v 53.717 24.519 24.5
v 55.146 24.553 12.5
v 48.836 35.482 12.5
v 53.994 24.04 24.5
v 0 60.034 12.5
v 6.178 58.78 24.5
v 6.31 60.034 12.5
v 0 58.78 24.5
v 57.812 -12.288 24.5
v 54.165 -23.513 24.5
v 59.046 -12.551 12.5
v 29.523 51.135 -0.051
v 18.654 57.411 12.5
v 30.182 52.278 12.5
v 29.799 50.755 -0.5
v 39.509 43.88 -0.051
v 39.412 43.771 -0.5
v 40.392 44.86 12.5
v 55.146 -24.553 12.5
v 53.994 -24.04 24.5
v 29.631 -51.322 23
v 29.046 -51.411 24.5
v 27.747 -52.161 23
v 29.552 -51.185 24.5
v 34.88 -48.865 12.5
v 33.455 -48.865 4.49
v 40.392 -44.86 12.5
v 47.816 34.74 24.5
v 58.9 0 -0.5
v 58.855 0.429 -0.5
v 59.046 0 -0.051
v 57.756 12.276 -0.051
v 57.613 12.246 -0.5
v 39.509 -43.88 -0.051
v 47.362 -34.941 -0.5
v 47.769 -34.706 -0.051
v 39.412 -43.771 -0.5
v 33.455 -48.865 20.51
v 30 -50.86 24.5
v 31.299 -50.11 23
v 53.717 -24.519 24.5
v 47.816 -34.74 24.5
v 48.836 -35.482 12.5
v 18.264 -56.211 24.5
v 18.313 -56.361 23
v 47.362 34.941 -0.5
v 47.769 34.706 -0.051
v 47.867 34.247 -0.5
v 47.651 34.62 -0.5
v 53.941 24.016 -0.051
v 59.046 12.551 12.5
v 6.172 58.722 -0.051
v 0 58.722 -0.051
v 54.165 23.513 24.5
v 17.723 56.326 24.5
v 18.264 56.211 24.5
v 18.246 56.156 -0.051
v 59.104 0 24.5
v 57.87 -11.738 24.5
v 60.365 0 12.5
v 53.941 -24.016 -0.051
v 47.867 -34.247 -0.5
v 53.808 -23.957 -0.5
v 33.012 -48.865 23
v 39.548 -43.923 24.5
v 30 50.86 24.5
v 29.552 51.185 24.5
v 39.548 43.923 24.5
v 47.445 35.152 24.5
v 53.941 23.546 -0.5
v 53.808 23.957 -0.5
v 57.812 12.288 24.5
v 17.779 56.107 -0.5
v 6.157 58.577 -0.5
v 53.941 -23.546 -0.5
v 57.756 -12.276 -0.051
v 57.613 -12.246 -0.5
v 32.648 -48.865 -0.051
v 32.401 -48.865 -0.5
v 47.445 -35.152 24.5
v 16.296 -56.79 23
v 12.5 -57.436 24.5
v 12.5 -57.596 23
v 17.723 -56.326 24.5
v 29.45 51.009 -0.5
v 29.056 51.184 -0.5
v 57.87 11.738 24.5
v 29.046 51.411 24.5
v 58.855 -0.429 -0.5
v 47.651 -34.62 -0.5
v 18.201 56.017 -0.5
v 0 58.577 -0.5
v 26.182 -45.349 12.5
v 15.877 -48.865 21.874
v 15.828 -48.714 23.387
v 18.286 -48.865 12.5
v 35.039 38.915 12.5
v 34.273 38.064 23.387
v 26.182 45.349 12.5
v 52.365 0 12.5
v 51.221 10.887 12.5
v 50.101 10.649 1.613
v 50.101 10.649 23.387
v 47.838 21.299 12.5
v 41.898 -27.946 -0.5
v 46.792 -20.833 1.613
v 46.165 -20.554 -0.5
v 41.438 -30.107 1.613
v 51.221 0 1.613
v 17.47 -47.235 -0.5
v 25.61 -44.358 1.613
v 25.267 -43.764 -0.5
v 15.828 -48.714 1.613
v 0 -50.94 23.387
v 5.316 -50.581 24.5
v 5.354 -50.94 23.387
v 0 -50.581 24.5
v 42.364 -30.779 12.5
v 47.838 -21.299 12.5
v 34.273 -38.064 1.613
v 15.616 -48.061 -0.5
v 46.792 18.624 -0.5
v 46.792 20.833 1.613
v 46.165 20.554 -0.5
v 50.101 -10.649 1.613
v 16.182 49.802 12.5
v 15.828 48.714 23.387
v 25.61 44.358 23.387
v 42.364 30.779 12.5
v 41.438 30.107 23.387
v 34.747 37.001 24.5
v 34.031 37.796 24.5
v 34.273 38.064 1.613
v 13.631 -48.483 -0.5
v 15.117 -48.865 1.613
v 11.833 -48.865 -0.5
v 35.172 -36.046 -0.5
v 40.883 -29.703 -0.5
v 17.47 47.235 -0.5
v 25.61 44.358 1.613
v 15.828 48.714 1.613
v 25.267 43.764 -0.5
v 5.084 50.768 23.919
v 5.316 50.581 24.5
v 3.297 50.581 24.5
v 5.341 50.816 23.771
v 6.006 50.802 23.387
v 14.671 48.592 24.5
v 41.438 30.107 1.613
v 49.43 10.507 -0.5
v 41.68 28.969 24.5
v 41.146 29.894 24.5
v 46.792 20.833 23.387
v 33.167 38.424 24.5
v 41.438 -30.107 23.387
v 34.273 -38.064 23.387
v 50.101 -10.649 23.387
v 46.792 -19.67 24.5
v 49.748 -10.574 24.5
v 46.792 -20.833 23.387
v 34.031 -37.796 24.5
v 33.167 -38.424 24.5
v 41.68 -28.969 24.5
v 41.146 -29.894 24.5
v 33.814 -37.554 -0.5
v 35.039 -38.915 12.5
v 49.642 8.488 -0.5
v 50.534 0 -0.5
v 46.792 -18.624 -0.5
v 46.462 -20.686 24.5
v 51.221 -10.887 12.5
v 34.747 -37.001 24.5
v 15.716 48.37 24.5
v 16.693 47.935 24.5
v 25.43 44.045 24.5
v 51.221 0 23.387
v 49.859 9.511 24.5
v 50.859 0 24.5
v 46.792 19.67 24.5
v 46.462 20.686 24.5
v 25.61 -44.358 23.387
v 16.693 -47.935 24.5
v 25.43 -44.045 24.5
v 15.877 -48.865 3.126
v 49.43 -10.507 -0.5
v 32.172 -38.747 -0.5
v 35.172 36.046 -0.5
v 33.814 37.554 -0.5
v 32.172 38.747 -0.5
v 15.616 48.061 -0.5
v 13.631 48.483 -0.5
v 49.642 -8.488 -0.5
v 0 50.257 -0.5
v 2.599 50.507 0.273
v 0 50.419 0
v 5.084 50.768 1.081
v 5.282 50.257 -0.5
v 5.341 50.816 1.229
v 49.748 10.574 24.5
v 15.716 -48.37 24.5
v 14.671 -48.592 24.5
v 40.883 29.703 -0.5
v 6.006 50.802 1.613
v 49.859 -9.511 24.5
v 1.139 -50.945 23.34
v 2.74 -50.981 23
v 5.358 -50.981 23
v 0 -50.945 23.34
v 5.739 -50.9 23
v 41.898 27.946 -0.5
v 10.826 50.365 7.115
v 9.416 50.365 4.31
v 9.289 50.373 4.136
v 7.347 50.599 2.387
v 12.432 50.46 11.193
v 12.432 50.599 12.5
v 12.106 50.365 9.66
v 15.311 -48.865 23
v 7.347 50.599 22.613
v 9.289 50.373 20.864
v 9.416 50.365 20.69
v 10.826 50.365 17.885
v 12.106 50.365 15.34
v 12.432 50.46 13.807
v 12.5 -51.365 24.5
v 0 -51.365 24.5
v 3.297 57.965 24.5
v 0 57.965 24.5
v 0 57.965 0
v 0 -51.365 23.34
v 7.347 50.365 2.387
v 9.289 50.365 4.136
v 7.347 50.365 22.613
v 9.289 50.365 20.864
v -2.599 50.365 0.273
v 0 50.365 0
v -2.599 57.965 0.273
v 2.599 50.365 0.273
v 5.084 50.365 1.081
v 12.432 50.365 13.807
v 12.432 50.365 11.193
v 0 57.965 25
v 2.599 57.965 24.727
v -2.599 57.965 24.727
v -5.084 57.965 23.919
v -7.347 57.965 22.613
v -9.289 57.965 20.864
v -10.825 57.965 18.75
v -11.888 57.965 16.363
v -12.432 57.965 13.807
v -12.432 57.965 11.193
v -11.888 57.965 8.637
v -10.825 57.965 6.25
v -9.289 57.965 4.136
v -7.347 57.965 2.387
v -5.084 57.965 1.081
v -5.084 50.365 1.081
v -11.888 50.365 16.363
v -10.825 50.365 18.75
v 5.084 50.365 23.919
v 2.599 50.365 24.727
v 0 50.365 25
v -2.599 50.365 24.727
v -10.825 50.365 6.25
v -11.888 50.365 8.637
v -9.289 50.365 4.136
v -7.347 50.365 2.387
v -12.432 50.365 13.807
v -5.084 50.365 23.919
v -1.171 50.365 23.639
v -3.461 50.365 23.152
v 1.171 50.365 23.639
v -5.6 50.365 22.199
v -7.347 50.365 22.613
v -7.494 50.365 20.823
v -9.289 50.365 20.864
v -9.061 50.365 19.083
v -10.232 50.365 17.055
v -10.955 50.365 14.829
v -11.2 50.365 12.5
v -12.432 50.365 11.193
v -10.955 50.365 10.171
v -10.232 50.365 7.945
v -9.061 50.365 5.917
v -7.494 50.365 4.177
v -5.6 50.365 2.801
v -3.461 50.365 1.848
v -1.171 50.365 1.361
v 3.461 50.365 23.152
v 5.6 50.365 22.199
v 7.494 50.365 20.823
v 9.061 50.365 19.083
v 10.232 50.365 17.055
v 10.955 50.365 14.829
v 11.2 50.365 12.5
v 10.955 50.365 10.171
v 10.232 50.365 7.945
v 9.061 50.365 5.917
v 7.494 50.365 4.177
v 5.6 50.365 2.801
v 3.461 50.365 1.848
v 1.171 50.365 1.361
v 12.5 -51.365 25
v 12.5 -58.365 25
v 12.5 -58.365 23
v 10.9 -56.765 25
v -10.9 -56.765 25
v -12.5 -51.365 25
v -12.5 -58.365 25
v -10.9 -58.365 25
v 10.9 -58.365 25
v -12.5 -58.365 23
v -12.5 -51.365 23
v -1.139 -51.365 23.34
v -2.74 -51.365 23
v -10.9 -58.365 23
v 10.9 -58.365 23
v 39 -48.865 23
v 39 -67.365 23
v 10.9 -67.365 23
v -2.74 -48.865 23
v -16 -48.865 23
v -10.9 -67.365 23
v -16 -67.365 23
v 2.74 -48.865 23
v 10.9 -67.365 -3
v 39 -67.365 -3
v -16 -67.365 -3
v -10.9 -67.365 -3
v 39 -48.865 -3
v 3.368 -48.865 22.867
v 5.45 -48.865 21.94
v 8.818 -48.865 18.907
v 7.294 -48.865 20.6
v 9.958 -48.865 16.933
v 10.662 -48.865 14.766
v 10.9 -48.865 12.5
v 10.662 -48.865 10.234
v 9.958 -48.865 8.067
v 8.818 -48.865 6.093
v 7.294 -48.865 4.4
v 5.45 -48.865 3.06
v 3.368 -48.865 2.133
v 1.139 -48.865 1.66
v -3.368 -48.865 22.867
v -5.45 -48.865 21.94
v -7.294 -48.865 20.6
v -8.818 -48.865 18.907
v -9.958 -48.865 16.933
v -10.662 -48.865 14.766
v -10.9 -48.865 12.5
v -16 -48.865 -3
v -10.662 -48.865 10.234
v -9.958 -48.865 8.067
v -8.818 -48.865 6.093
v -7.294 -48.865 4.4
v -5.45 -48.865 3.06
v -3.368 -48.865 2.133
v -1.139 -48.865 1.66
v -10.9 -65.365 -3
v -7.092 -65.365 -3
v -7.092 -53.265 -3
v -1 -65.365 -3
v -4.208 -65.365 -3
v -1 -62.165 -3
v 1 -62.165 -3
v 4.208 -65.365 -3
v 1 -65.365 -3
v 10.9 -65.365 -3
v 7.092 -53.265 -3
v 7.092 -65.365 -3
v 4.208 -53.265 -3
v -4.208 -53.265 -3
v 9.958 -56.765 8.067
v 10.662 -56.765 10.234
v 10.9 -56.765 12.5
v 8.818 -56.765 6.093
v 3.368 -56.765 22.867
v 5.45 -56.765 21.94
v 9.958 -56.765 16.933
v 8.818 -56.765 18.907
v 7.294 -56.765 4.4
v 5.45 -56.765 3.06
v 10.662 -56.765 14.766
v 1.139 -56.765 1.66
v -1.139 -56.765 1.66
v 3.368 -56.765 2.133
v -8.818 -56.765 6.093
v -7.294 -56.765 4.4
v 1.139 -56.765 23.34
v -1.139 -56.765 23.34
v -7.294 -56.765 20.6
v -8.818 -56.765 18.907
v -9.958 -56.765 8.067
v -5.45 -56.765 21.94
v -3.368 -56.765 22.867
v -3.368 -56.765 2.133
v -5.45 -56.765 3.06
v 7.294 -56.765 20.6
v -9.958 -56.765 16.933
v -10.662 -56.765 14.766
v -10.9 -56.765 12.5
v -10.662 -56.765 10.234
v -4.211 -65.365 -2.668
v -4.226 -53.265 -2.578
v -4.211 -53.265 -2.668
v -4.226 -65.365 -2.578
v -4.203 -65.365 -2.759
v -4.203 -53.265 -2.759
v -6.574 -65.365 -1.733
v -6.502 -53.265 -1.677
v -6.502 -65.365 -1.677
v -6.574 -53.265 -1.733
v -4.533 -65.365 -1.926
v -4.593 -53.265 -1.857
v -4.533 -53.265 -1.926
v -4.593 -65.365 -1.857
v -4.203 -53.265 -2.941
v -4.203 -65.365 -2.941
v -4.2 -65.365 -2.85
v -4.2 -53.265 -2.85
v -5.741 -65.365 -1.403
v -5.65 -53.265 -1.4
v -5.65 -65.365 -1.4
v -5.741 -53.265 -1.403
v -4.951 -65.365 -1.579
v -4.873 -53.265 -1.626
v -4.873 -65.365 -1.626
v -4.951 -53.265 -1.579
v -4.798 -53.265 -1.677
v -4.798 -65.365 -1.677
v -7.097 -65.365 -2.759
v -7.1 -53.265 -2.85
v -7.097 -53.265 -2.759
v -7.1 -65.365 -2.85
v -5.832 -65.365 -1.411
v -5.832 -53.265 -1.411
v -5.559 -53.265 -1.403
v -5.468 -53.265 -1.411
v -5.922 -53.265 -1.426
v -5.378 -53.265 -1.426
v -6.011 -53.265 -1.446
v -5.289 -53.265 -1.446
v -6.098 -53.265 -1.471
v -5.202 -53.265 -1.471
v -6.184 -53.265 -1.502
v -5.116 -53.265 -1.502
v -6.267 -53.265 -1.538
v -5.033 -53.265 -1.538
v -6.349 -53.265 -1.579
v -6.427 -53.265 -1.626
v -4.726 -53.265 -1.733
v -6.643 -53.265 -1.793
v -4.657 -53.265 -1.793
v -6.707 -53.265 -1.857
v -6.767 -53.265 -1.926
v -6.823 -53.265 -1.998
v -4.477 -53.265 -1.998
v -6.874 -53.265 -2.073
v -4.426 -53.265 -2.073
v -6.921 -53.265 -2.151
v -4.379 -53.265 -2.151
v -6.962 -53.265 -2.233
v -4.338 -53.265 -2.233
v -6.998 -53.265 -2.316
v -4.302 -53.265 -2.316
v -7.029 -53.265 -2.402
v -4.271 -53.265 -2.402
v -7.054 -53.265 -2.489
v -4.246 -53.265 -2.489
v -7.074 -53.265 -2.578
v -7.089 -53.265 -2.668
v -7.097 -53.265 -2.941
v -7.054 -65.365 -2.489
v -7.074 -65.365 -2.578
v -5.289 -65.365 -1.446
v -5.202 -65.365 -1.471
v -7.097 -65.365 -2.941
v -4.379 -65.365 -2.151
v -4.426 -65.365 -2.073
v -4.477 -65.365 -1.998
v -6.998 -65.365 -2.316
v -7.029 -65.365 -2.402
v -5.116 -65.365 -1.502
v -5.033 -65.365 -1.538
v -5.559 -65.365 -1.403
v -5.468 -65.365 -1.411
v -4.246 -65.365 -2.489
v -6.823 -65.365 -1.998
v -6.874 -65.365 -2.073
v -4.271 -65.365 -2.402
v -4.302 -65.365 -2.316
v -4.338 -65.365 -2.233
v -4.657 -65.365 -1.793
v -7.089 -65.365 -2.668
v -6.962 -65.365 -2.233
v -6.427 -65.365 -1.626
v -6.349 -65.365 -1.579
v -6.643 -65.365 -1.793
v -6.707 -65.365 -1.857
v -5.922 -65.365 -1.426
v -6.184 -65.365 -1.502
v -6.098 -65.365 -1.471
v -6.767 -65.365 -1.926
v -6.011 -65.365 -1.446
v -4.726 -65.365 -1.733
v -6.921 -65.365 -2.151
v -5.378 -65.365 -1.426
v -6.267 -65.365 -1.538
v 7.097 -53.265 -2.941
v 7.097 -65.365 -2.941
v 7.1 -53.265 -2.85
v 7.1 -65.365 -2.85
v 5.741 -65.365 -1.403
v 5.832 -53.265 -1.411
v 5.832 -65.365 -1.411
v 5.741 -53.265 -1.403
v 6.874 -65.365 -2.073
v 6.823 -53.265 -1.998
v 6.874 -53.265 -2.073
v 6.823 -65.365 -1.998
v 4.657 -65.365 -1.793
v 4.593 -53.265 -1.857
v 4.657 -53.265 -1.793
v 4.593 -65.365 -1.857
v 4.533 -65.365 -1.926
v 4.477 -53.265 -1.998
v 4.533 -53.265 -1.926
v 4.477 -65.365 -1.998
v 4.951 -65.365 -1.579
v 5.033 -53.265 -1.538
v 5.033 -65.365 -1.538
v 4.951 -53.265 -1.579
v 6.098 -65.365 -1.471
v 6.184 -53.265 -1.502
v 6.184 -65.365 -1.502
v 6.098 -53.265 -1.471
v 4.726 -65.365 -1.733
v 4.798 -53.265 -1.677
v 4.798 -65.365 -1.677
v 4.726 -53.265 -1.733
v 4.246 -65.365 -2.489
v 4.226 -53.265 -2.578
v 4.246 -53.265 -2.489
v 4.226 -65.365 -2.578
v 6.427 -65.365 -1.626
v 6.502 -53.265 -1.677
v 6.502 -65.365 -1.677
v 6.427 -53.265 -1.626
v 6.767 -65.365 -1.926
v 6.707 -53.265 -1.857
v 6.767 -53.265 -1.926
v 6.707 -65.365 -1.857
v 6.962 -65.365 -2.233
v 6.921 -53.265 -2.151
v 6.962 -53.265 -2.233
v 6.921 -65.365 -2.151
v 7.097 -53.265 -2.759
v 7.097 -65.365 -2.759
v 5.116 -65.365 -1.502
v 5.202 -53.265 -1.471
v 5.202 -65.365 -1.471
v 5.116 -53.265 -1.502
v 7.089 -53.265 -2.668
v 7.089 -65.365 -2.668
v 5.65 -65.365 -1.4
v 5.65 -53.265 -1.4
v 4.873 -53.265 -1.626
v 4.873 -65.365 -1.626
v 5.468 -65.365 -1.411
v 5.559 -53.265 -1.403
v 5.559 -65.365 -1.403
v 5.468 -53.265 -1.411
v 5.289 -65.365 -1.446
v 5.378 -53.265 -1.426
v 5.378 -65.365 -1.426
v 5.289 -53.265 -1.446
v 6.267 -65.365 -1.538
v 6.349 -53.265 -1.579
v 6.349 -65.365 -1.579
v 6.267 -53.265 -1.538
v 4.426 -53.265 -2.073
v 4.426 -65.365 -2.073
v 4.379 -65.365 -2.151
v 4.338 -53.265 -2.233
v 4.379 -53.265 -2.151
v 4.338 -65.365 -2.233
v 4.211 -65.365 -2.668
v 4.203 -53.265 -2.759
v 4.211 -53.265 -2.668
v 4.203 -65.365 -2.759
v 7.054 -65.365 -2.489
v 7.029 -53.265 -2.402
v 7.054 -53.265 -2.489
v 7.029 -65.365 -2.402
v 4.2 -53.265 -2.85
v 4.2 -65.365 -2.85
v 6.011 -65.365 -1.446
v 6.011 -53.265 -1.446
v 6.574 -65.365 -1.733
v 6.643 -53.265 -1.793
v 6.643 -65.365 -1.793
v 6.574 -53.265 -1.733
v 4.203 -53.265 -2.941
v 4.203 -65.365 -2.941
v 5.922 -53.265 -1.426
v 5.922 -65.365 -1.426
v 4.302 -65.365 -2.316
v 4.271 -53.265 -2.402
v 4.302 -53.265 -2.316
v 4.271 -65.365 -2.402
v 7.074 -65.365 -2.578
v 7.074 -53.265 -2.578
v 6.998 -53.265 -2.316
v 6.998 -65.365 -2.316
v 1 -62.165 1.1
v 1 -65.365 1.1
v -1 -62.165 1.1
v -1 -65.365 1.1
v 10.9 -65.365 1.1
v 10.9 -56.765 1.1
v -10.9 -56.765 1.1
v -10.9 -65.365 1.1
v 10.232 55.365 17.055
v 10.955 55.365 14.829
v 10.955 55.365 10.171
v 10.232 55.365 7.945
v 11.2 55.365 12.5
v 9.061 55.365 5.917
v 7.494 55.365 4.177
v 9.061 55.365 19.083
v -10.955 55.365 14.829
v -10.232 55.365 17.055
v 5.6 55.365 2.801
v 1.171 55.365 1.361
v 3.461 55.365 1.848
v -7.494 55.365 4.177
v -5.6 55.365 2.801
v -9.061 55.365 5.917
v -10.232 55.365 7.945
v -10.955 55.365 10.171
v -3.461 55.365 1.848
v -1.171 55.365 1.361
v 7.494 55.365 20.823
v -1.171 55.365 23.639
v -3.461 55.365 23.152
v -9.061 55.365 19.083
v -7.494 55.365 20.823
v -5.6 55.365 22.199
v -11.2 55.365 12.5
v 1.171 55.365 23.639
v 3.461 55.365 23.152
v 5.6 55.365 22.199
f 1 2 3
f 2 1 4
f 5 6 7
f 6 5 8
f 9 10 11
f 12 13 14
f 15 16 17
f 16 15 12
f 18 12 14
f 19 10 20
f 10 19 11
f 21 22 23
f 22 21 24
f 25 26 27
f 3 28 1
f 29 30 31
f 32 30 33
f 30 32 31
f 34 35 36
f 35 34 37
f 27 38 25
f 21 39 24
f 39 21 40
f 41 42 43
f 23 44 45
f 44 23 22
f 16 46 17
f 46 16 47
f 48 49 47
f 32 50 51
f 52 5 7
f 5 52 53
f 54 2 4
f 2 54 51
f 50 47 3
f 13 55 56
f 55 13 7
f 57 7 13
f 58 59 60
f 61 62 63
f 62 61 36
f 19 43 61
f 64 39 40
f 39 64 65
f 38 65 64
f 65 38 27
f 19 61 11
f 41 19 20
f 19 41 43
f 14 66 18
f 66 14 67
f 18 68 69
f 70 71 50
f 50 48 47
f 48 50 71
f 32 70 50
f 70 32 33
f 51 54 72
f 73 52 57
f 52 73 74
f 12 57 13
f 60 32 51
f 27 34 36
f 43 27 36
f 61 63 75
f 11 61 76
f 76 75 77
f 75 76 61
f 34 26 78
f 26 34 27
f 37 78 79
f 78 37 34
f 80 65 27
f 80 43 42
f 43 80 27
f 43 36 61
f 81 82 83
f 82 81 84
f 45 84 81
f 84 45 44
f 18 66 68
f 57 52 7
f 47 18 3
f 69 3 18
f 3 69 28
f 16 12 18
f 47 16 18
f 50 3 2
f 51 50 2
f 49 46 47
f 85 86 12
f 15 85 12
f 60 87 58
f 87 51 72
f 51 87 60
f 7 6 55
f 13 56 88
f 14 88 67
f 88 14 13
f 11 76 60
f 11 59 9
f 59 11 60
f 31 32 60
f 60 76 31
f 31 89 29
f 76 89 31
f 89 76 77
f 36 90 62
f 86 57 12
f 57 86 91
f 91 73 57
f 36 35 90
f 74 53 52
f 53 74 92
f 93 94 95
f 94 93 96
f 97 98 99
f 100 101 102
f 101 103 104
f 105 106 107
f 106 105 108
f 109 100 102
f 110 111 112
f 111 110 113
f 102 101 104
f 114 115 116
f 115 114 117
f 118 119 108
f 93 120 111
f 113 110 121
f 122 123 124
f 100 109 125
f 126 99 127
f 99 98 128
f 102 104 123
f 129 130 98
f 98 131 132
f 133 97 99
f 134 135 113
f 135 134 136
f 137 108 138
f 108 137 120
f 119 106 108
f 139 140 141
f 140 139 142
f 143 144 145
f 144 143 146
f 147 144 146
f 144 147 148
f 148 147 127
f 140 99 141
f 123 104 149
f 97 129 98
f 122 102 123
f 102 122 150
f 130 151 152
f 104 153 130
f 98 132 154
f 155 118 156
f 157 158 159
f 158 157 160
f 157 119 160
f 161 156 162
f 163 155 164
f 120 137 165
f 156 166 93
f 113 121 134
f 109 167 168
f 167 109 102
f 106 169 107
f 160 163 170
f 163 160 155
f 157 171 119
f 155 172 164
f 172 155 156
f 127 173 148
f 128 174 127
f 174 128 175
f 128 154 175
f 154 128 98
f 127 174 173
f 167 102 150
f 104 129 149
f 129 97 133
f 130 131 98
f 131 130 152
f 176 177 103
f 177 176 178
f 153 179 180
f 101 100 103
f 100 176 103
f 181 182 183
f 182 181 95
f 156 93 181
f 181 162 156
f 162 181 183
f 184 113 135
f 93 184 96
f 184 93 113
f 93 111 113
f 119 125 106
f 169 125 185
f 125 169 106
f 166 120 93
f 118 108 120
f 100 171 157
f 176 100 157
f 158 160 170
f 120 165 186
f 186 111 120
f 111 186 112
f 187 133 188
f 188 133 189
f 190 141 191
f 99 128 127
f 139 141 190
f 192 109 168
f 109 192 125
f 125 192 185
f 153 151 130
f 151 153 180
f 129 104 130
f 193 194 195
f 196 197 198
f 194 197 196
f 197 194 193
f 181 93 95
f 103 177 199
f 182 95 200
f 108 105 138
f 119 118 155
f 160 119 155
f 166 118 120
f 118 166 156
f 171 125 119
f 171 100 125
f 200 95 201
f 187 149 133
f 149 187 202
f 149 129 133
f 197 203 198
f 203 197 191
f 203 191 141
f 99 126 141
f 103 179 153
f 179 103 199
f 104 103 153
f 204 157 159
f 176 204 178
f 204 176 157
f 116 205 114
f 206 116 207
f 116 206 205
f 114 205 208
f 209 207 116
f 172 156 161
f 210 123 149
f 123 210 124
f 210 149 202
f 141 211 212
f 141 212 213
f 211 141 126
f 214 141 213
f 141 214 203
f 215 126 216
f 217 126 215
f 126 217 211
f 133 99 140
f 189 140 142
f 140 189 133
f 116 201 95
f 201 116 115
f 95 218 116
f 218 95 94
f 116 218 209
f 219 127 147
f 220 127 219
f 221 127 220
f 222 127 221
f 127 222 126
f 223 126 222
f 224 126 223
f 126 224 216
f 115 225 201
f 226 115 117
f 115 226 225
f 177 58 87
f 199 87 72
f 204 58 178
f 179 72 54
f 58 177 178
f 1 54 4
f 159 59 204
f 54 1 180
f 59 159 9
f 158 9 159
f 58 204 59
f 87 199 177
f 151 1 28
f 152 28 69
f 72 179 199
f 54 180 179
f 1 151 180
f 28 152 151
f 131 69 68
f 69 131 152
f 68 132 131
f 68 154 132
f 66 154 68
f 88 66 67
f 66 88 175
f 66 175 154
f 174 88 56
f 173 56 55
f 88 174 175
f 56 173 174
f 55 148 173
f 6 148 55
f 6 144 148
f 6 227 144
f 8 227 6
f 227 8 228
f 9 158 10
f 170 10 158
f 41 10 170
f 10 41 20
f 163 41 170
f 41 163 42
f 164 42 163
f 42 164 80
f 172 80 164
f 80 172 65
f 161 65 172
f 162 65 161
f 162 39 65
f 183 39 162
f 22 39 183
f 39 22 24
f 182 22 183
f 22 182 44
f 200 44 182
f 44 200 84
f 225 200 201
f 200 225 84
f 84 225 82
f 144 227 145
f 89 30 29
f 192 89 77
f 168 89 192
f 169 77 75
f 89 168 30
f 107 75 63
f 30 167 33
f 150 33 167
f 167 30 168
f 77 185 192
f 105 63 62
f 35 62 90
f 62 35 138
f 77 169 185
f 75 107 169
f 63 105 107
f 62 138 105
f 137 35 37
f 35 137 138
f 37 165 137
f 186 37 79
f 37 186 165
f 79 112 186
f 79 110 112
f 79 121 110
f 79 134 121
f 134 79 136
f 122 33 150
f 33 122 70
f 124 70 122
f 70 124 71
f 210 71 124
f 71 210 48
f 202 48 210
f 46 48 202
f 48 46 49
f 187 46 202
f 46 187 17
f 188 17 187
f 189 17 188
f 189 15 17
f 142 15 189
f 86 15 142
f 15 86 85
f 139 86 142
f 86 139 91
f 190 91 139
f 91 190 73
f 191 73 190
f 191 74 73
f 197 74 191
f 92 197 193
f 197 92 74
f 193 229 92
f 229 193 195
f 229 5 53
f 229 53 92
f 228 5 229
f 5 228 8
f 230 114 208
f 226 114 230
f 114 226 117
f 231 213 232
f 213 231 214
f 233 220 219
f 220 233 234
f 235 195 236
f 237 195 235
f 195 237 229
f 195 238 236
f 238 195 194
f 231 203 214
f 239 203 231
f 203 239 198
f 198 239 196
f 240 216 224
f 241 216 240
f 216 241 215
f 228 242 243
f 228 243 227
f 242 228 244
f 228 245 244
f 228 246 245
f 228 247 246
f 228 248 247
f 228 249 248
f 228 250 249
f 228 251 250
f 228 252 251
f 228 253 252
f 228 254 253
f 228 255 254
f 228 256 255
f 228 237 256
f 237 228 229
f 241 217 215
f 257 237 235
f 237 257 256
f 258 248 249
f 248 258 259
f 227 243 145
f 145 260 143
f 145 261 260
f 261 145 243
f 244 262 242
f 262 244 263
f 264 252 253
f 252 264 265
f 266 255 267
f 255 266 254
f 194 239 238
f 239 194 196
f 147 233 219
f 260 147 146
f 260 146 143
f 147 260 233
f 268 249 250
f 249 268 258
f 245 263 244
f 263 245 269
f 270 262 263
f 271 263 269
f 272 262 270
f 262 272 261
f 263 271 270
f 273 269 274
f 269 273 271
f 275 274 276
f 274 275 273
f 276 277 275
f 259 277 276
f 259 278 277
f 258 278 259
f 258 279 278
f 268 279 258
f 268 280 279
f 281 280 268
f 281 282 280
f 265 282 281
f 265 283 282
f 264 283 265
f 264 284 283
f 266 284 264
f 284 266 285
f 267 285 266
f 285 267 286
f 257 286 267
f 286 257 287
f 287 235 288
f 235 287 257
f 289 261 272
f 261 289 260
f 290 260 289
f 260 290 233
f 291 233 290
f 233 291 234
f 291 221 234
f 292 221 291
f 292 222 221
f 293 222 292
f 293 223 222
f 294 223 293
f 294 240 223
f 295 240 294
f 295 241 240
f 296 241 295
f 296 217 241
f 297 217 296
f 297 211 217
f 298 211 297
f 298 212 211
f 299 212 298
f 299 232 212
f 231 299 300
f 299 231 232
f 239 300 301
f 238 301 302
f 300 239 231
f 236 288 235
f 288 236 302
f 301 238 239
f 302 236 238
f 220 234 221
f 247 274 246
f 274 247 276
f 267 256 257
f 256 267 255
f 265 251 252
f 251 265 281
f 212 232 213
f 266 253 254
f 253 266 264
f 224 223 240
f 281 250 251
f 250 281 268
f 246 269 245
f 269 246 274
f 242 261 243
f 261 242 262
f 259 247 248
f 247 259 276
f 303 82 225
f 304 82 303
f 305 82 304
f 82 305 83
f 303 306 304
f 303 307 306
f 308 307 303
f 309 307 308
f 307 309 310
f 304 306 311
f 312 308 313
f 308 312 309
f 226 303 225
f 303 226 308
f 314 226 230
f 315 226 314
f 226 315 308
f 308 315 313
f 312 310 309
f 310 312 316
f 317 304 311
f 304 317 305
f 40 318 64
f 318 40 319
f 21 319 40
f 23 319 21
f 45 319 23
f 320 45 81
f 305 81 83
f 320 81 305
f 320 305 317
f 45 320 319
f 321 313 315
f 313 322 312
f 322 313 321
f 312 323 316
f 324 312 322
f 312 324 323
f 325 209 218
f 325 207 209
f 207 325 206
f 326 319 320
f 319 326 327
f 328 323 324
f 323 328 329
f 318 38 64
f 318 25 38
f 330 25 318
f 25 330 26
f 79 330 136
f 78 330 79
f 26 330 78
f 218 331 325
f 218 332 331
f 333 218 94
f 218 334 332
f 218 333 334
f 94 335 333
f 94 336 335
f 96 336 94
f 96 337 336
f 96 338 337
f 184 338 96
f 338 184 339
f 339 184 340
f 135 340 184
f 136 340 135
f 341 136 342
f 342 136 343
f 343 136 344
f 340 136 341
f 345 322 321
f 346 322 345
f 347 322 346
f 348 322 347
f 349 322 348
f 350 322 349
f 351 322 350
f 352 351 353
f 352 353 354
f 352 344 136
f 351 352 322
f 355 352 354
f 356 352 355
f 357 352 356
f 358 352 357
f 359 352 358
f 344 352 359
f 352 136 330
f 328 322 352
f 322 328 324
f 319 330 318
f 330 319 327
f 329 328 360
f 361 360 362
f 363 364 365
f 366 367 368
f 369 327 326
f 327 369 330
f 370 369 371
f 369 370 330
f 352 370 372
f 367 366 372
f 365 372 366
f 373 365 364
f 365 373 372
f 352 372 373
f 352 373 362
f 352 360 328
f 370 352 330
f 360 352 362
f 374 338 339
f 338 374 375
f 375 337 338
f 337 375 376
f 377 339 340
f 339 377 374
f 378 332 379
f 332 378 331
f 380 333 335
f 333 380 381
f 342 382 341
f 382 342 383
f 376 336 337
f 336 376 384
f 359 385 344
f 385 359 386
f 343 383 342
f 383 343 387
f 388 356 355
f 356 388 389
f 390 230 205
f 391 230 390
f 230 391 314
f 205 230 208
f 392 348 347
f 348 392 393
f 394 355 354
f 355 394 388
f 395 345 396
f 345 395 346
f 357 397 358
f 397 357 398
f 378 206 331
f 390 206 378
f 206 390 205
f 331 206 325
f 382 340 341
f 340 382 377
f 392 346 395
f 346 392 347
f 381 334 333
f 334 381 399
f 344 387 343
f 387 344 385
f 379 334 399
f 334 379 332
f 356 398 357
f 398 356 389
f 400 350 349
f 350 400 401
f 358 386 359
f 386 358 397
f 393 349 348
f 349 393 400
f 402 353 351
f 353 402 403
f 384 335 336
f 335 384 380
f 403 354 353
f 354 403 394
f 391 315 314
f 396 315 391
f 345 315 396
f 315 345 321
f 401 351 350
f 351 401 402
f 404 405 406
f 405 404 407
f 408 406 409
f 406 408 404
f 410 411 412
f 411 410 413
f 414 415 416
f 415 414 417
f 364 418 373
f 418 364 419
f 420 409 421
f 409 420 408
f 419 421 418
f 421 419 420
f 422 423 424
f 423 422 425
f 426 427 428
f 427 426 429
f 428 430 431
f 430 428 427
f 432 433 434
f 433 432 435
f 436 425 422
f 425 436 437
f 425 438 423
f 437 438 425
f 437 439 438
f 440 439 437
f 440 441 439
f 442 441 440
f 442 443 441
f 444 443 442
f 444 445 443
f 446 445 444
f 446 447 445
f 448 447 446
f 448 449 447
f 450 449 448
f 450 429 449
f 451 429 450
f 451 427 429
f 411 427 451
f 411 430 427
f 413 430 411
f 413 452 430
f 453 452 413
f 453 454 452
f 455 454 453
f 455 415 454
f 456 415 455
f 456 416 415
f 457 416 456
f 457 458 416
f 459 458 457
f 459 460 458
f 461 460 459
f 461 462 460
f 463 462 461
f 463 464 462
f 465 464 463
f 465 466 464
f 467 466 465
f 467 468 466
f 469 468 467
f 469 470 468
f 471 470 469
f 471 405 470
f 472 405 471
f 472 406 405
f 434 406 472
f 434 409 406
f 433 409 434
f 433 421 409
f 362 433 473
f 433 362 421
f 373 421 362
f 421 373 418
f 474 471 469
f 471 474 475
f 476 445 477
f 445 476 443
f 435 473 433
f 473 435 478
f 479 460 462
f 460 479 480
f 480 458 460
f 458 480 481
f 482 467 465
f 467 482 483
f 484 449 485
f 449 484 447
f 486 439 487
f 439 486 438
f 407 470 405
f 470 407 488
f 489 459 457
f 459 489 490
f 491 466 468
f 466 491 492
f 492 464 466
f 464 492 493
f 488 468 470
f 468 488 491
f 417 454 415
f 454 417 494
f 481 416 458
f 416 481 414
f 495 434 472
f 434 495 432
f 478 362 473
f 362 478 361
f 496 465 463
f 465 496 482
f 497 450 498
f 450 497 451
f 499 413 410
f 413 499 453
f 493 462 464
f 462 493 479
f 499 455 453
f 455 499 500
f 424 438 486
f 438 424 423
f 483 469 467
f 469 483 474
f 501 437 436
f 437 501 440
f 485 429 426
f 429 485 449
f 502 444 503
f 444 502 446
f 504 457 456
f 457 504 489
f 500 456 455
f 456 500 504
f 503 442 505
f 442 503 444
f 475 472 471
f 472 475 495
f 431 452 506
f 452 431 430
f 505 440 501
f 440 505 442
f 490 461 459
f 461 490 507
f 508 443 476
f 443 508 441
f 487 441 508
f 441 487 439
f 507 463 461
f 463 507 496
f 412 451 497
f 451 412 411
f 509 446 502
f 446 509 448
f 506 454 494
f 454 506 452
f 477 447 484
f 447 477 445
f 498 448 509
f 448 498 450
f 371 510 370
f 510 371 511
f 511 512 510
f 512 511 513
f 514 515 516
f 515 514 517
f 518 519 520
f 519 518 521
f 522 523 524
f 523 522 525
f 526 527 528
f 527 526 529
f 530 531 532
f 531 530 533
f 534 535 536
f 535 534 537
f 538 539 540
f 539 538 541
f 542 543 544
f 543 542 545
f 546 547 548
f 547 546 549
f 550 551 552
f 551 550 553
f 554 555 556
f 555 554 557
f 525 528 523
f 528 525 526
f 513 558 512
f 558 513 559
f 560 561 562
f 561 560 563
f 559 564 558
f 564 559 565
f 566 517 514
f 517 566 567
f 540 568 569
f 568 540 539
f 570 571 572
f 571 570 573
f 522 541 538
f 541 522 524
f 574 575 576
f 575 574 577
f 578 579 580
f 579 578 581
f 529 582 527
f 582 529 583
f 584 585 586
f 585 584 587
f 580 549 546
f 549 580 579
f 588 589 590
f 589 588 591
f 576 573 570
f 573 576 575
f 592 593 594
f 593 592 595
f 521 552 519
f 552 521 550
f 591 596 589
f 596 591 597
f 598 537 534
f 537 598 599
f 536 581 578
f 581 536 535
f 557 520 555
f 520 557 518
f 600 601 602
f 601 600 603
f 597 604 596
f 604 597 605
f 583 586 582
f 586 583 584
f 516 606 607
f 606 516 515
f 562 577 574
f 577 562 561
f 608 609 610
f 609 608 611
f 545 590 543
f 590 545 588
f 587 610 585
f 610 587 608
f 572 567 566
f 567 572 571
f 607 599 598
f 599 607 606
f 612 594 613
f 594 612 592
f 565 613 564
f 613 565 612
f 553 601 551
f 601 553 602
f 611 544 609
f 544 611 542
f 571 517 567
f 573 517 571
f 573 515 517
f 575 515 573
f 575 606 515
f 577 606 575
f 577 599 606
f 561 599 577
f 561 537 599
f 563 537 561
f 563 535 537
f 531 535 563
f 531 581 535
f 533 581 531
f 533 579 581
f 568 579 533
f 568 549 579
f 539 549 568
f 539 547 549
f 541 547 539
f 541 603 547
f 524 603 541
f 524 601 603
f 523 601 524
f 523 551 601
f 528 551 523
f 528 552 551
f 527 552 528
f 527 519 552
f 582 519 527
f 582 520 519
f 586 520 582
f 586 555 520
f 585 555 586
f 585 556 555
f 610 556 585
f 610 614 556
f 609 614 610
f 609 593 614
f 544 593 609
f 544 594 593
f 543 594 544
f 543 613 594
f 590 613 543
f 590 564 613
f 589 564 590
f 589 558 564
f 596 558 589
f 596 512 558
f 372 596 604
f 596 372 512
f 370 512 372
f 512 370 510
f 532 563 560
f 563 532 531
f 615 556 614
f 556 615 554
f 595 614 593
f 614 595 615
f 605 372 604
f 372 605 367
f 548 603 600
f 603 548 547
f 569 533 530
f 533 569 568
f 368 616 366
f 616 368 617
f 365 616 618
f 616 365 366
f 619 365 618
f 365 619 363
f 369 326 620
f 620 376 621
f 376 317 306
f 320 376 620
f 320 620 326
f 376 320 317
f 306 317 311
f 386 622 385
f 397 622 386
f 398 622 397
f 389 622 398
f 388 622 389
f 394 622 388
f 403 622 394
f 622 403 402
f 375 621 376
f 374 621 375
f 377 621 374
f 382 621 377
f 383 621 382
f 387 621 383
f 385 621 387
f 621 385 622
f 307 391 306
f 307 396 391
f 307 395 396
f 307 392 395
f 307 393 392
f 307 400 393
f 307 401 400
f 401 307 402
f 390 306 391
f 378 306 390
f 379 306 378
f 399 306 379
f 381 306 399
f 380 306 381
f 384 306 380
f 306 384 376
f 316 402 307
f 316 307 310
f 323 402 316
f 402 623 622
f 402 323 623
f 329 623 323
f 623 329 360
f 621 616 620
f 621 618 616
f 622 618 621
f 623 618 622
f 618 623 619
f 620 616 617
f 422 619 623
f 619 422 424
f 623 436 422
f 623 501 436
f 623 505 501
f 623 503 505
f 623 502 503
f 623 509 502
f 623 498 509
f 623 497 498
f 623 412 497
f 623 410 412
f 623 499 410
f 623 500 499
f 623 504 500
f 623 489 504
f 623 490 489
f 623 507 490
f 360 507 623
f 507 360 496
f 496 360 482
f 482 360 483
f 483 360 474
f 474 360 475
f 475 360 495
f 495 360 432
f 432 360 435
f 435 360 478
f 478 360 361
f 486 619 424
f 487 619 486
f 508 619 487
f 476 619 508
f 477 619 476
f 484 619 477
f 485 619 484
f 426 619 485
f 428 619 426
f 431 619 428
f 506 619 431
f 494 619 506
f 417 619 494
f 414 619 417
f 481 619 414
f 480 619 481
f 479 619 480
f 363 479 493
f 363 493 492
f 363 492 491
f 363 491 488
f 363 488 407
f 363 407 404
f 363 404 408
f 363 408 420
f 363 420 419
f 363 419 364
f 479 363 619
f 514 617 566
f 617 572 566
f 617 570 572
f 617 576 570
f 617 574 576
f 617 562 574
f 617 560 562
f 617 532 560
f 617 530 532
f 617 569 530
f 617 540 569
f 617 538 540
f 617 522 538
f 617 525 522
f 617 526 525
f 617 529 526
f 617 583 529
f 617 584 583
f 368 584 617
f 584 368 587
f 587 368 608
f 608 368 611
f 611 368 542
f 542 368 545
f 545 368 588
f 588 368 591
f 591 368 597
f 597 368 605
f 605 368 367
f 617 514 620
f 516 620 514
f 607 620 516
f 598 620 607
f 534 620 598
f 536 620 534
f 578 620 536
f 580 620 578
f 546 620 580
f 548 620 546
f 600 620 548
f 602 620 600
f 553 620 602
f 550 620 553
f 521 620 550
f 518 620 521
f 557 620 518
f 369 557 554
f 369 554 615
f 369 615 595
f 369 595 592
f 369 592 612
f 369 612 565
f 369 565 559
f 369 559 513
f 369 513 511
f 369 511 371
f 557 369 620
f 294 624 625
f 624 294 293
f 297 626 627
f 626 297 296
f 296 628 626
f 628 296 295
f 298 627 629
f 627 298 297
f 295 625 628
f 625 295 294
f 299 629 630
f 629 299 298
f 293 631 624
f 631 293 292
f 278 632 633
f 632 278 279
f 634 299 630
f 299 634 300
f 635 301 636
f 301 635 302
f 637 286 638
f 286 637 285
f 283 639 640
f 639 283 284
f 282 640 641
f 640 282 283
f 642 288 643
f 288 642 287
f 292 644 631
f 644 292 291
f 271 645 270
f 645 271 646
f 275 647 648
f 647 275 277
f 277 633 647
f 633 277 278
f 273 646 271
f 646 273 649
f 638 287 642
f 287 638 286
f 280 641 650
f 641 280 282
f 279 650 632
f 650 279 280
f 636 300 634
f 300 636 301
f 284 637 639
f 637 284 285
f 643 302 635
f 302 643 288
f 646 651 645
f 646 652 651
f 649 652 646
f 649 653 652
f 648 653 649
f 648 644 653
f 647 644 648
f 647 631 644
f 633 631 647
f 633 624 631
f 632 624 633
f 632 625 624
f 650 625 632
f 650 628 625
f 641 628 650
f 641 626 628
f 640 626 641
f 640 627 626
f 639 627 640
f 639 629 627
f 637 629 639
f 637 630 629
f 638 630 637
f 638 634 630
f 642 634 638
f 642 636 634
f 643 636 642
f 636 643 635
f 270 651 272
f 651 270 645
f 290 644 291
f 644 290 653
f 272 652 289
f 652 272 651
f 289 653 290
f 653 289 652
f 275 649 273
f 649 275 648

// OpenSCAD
// file: ../../../hardware/Vitamins/Sensors/Camera/QuickCam_STX.scad
$fn = 60;

function getNubRadius() =1.3;
function getPinHeight() = 10;
function getFlangeWidth(tolerance)= 2.3 + tolerance;
function getFlangeLength(tolerance)= 6.64 + tolerance;
function getQuickCamRadius(tolerance)= 55.93/2 +tolerance;
function getLandingPadThickness() = 5;
function getUsbWidth() = 9.5;
function getUsbHeight()=17.5;

module CameraMount( 3dPrinterTolerance=.4)
{
	union(){
		//central pin	
		cylinder(getPinHeight(),							// length of the pin
				 (4.5-3dPrinterTolerance)/2, 	// radius of the pin
				 (4.5-3dPrinterTolerance)/2, 	// radius of the pin
				 false);						//non centered
		//nubs			 
		translate([0,getNubRadius(),getPinHeight()-getNubRadius()]){
			rotate([0,90,0]){		 
				cylinder(getFlangeWidth(3dPrinterTolerance),	// length of the pin
					 getNubRadius(), 	// radius of the pin
					 getNubRadius(), 	// radius of the pin
					 true);						//non centered
			 }
		}
		//nubs			 
		translate([0,-getNubRadius(),getPinHeight()-getNubRadius()]){
			rotate([0,90,0]){		 
				cylinder(getFlangeWidth(3dPrinterTolerance),	// length of the pin
					 getNubRadius(), 	// radius of the pin
					 getNubRadius(), 	// radius of the pin
					 true);						//non centered
			 }
		}
		//Flange		 
		translate([getFlangeWidth(3dPrinterTolerance)/-2,getFlangeLength(3dPrinterTolerance)/-2,0]){		 
			cube([	getFlangeWidth(3dPrinterTolerance), 
					getFlangeLength(3dPrinterTolerance), 
					getPinHeight()-getFlangeWidth(3dPrinterTolerance)-1
				]);
		}		 
		// Landing pad			 
		translate([0,0,-getLandingPadThickness()]){		 
			cylinder(getLandingPadThickness(),	// length of the landing pad
					 15, 						// radius of the landing pad
					 15, 						// radius of the landing pad
					 false);
		}		 
	}		 
	
}

module cameraViewingCone(){

}

module QuickCam(3dPrinterTolerance=.4){
	union(){
		difference(){
			translate([0,0,getQuickCamRadius(3dPrinterTolerance)]){		 
				sphere(getQuickCamRadius(3dPrinterTolerance));
			}	
			
			CameraMount( 3dPrinterTolerance);
		}
		color("red"){
			translate([0,0,getQuickCamRadius(3dPrinterTolerance)]){	
				rotate([90,0,0]){
					cylinder(	getQuickCamRadius(3dPrinterTolerance)*2,	//
								0, 						// 
						 		50, 						// 
						 		false);
		 		}
			}	
		}
		translate([0,0,getQuickCamRadius(3dPrinterTolerance)]){	
			rotate([-125,0,0]){
				translate([-getUsbHeight()/2,0,0]){	
					cube([	getUsbHeight(),
					 		getUsbWidth(),
					 		getQuickCamRadius(3dPrinterTolerance)*1.5]);
			 	}
	 		}
		}
		
	}
}

module camInterface(){
//translate([0,0,getLandingPadThickness()]){
//	CameraMount();
//}
	difference(){	 
		#cylinder(	getQuickCamRadius(0),	//
					getQuickCamRadius(0), 						// 
			 		getQuickCamRadius(0), 						// 
			 		false);
		translate([0,0,4]){	
			QuickCam();
		}
	}

}
camInterface();
//QuickCam();
// file: ../../../hardware/Vitamins/Structural/SealedBearings/SealedBearing608_Vitamin.scad
function 608BallBearingDiam(3dPrinterTolerance=.4) = 22+3dPrinterTolerance;
function 608BallBearingHeight(3dPrinterTolerance=.4) = 7+3dPrinterTolerance;
function 608BallBearingInnerDiam(3dPrinterTolerance=.4)= 8-3dPrinterTolerance;

function 608BallBearingAvgDiam(3dPrinterTolerance=.4)= (608BallBearingDiam(3dPrinterTolerance)+608BallBearingInnerDiam(3dPrinterTolerance))/2;


module 608BallBearing(3dPrinterTolerance=.4)
{
	union()
	{
		cylinder(608BallBearingHeight(3dPrinterTolerance), 608BallBearingDiam(3dPrinterTolerance)/2, 608BallBearingDiam(3dPrinterTolerance)/2, 0);
		//cylinder(608BallBearingHeight(3dPrinterTolerance), 608BallBearingInnerDiam(3dPrinterTolerance)/2, 608BallBearingInnerDiam(3dPrinterTolerance)/2);
	}
}

608BallBearing();
// file: TiltRingHolder.scad
use <CameraMount.scad>
use <../../../hardware/Vitamins/Actuators/StandardServo/StandardServo_Vitamin.scad>
use <../../../hardware/Vitamins/Structural/SealedBearings/SealedBearing608_Vitamin.scad>
use <../../../hardware/Vitamins/Sensors/Camera/QuickCam_STX.scad>

function getRingRadius(3dPrinterTolerance=.4) = getQuickCamRadius(3dPrinterTolerance)+getCamerabarWidth()*2;


module clearenceParts(3dPrinterTolerance=.4){
	union(){
		cameraTiltBar();
		cameraTiltServo();
		placeBearingPart(3dPrinterTolerance){
			608BallBearing(3dPrinterTolerance);		
		}
	}
}

module cameraPanServo(3dPrinterTolerance=.4, screwAlignment=0){
	translate([	0,
	           	-(getRingRadius(3dPrinterTolerance)),
				getCamerabarThickness()/2]){
				rotate([-90,0,0]){
					rotate([0,0,screwAlignment]){
						StandardServoMotor(true, 1, true, .4);
					}
				}
			}
}

module placePanBearing(3dPrinterTolerance=.4){
	translate([	0,
	           	getRingRadius(3dPrinterTolerance)-3dPrinterTolerance,
					getCamerabarThickness()/2]){
						rotate([-90,0,0]){
							for (i = [0 : $children-1]){
								 child(i);
							 }
						}
		}
}

module outerRing(3dPrinterTolerance=.4){
	union(){
		// ring section
		intersection(){
			cylinder(	h=getCamerabarThickness(),				//
									r=getRingRadius(3dPrinterTolerance), 	// 
									center=false);
			translate([0,0,getCamerabarThickness()/2]){
				difference(){
					sphere(getRingRadius(3dPrinterTolerance));
					sphere(getQuickCamRadius(3dPrinterTolerance)+getCamerabarWidth()+2);
				}
			}
		}
		// servo mount block
		translate([	-(StandardServoBoltHeight()+5+getQuickCamRadius(3dPrinterTolerance)+getCamerabarWidth() +1),
		           	-37.5,
		           	0]){
			
			cube([StandardServoBoltHeight()+5,StandardServoLength(),getCamerabarThickness()]);
		}
		placePanBearing(3dPrinterTolerance){
			cylinder(	608BallBearingHeight(3dPrinterTolerance)*2,
										608BallBearingInnerDiam(3dPrinterTolerance)/2,
										608BallBearingInnerDiam(3dPrinterTolerance)/2,
										false
										);
		}
	}
}

module tiltRing(3dPrinterTolerance=.4){
	difference(){
		outerRing(3dPrinterTolerance);
		clearenceParts(3dPrinterTolerance);
		cameraPanServo(screwAlignment=0);
	}
}

tiltRing(.3);
// file: CameraMount.scad
use <../../../hardware/Vitamins/Actuators/StandardServo/StandardServo_Vitamin.scad>
use <../../../hardware/Vitamins/Sensors/Camera/QuickCam_STX.scad>
use <../../../hardware/Vitamins/Structural/SealedBearings/SealedBearing608_Vitamin.scad>

//QuickCam();

//StandardServoMotor(true, 1, false, .4);

function getCamerabarThickness()=25;
function getCamerabarWidth()=10;

module getBar(3dPrinterTolerance=.4){
//	cylinder(	getCamerabarThickness(),				//
//							getQuickCamRadius(3dPrinterTolerance)+getCamerabarWidth(), 	// 
//					 		getQuickCamRadius(3dPrinterTolerance)+getCamerabarWidth(), 	// 
//					 		false);
	union(){
		intersection(){
				cylinder(	h=getCamerabarThickness(),				//
							r=getQuickCamRadius(3dPrinterTolerance)+getCamerabarWidth(), 	// 
							center=false);
				translate([0,0,getCamerabarThickness()/2])
					sphere(getQuickCamRadius(3dPrinterTolerance)+getCamerabarWidth());
			}
	}
}

module coreCameraBar(3dPrinterTolerance=.4){
	union(){
		
		
			
		difference(){
			getBar(3dPrinterTolerance);
			
			translate([0,-getQuickCamRadius(3dPrinterTolerance),getCamerabarThickness()/2]){
				rotate([-90,0,0]){
					QuickCam();
				}
			}
			translate([-(getQuickCamRadius(3dPrinterTolerance)+getCamerabarThickness()),0,-1]){
				rotate([0,0,0]){
					cube([	(getQuickCamRadius(3dPrinterTolerance)+getCamerabarThickness())*2,
							(getQuickCamRadius(3dPrinterTolerance)+getCamerabarThickness())*2,
							(getQuickCamRadius(3dPrinterTolerance)+getCamerabarThickness())*2]);
				}
			}
			
			translate([	-(getQuickCamRadius(3dPrinterTolerance)+getCamerabarThickness()),
						-(((getQuickCamRadius(3dPrinterTolerance)+getCamerabarThickness())*2)+ (getQuickCamRadius(3dPrinterTolerance)+(getCamerabarThickness()/2))),
						-1]){
				rotate([0,0,0]){
					cube([	(getQuickCamRadius(3dPrinterTolerance)+getCamerabarThickness())*2,
							(getQuickCamRadius(3dPrinterTolerance)+getCamerabarThickness())*2,
							(getQuickCamRadius(3dPrinterTolerance)+getCamerabarThickness())*2]);
				}
			}
		}
		//Bearing brick
		translate([getQuickCamRadius(3dPrinterTolerance),
		           0,
		           getCamerabarThickness()/2]){
			rotate([0,90,0]){
				cylinder(	h=getCamerabarWidth(),				//
							r=getCamerabarThickness()/2, 	// 
							center=false);
			}
//			cube([	getCamerabarWidth(),
//					getCamerabarThickness(),
//					getCamerabarThickness()]);
		}
		//Servo Brick
		translate([-(getQuickCamRadius(3dPrinterTolerance)+getCamerabarWidth()),
		           0,
		           getCamerabarThickness()/2]){
					rotate([0,90,0]){
						cylinder(	h=getCamerabarWidth(),				//
									r=getCamerabarThickness()/2, 	// 
									center=false);
					}
		}
		// Bearing rod
		placeBearingPart(3dPrinterTolerance){
				cylinder(	608BallBearingHeight(3dPrinterTolerance)*2,
							608BallBearingInnerDiam(3dPrinterTolerance)/2,
							608BallBearingInnerDiam(3dPrinterTolerance)/2,
							false
							);
			
		}
	}
}

module placeBearingPart(3dPrinterTolerance=.4){
	translate([	getQuickCamRadius(3dPrinterTolerance)+getCamerabarWidth(),
					0,
					getCamerabarThickness()/2]){
						rotate([0,90,0]){
							for (i = [0 : $children-1]){
								 child(i);
							 }
						}
		}
}

module cameraTiltServo(3dPrinterTolerance=.4, screwAlignment=0){
	translate([	-(getQuickCamRadius(3dPrinterTolerance)+getCamerabarWidth()),
						0,
						getCamerabarThickness()/2]){
				rotate([0,90,0]){
					rotate([0,0,screwAlignment]){
						StandardServoMotor(true, 1, true, .4);
					}
				}
			}
}

module cameraTiltBar(3dPrinterTolerance=.4){
	difference(){
		coreCameraBar(3dPrinterTolerance);
		cameraTiltServo(3dPrinterTolerance,45);
	}
	
}

cameraTiltBar();
// main file
use <CameraMount.scad>
use <TiltRingHolder.scad>
use <../../../hardware/Vitamins/Actuators/StandardServo/StandardServo_Vitamin.scad>
use <../../../hardware/Vitamins/Structural/SealedBearings/SealedBearing608_Vitamin.scad>
use <../../../hardware/Vitamins/Sensors/Camera/QuickCam_STX.scad>

function getPanRingRadius(3dPrinterTolerance=.4) = getRingRadius(3dPrinterTolerance)+getCamerabarWidth()+2;

module mainPanRing(3dPrinterTolerance=.4){
	intersection(){
		translate([0,-getPanRingRadius(3dPrinterTolerance),-.5]){
				cube([getPanRingRadius(3dPrinterTolerance)*2,getPanRingRadius(3dPrinterTolerance)*2,getCamerabarThickness()]);
		}
		translate([0,0,getCamerabarThickness()/2]){
			difference(){
				sphere(getPanRingRadius(3dPrinterTolerance));
				sphere(getRingRadius(3dPrinterTolerance)+4);
			}
		}
	}
	
	
	//Bearing brick
	translate([0,
	           getPanRingRadius(3dPrinterTolerance)-2.4,
	           getCamerabarThickness()/2]){
		rotate([90,90,0]){
			cylinder(	h=getCamerabarWidth()-2.4,				//
						r=getCamerabarThickness()/2, 	// 
						center=false);
		}
	}
	//Bearing brick
	translate([-getCamerabarThickness()/2,
			   -getPanRingRadius(3dPrinterTolerance)+2,
			  0]){
					cube([	getCamerabarThickness(),
							getCamerabarWidth()-3,
							getCamerabarThickness()]);
	}
	//Servo Brick
	translate([0,
	           -(getPanRingRadius(3dPrinterTolerance)-getCamerabarWidth() ),
	           StandardServoThickness()/2]){
		rotate([90,90,0]){
			translate([	-getCamerabarThickness()/2,
			           	(-getCamerabarThickness()/2)-3.5,
						-1.5]){
						union(){
							cube([	StandardServoThickness()+5,
									StandardServoLength(),
									StandardServoBoltHeight()+5]);
							
						}
			}
		}
	}
}

module panRingHolder(3dPrinterTolerance=.4){
	
	difference(){
		mainPanRing(3dPrinterTolerance);
		placePanBearing(3dPrinterTolerance){
			608BallBearing(3dPrinterTolerance);		
		}
		cameraPanServo(3dPrinterTolerance, 0);
	}
}

panRingHolder();
